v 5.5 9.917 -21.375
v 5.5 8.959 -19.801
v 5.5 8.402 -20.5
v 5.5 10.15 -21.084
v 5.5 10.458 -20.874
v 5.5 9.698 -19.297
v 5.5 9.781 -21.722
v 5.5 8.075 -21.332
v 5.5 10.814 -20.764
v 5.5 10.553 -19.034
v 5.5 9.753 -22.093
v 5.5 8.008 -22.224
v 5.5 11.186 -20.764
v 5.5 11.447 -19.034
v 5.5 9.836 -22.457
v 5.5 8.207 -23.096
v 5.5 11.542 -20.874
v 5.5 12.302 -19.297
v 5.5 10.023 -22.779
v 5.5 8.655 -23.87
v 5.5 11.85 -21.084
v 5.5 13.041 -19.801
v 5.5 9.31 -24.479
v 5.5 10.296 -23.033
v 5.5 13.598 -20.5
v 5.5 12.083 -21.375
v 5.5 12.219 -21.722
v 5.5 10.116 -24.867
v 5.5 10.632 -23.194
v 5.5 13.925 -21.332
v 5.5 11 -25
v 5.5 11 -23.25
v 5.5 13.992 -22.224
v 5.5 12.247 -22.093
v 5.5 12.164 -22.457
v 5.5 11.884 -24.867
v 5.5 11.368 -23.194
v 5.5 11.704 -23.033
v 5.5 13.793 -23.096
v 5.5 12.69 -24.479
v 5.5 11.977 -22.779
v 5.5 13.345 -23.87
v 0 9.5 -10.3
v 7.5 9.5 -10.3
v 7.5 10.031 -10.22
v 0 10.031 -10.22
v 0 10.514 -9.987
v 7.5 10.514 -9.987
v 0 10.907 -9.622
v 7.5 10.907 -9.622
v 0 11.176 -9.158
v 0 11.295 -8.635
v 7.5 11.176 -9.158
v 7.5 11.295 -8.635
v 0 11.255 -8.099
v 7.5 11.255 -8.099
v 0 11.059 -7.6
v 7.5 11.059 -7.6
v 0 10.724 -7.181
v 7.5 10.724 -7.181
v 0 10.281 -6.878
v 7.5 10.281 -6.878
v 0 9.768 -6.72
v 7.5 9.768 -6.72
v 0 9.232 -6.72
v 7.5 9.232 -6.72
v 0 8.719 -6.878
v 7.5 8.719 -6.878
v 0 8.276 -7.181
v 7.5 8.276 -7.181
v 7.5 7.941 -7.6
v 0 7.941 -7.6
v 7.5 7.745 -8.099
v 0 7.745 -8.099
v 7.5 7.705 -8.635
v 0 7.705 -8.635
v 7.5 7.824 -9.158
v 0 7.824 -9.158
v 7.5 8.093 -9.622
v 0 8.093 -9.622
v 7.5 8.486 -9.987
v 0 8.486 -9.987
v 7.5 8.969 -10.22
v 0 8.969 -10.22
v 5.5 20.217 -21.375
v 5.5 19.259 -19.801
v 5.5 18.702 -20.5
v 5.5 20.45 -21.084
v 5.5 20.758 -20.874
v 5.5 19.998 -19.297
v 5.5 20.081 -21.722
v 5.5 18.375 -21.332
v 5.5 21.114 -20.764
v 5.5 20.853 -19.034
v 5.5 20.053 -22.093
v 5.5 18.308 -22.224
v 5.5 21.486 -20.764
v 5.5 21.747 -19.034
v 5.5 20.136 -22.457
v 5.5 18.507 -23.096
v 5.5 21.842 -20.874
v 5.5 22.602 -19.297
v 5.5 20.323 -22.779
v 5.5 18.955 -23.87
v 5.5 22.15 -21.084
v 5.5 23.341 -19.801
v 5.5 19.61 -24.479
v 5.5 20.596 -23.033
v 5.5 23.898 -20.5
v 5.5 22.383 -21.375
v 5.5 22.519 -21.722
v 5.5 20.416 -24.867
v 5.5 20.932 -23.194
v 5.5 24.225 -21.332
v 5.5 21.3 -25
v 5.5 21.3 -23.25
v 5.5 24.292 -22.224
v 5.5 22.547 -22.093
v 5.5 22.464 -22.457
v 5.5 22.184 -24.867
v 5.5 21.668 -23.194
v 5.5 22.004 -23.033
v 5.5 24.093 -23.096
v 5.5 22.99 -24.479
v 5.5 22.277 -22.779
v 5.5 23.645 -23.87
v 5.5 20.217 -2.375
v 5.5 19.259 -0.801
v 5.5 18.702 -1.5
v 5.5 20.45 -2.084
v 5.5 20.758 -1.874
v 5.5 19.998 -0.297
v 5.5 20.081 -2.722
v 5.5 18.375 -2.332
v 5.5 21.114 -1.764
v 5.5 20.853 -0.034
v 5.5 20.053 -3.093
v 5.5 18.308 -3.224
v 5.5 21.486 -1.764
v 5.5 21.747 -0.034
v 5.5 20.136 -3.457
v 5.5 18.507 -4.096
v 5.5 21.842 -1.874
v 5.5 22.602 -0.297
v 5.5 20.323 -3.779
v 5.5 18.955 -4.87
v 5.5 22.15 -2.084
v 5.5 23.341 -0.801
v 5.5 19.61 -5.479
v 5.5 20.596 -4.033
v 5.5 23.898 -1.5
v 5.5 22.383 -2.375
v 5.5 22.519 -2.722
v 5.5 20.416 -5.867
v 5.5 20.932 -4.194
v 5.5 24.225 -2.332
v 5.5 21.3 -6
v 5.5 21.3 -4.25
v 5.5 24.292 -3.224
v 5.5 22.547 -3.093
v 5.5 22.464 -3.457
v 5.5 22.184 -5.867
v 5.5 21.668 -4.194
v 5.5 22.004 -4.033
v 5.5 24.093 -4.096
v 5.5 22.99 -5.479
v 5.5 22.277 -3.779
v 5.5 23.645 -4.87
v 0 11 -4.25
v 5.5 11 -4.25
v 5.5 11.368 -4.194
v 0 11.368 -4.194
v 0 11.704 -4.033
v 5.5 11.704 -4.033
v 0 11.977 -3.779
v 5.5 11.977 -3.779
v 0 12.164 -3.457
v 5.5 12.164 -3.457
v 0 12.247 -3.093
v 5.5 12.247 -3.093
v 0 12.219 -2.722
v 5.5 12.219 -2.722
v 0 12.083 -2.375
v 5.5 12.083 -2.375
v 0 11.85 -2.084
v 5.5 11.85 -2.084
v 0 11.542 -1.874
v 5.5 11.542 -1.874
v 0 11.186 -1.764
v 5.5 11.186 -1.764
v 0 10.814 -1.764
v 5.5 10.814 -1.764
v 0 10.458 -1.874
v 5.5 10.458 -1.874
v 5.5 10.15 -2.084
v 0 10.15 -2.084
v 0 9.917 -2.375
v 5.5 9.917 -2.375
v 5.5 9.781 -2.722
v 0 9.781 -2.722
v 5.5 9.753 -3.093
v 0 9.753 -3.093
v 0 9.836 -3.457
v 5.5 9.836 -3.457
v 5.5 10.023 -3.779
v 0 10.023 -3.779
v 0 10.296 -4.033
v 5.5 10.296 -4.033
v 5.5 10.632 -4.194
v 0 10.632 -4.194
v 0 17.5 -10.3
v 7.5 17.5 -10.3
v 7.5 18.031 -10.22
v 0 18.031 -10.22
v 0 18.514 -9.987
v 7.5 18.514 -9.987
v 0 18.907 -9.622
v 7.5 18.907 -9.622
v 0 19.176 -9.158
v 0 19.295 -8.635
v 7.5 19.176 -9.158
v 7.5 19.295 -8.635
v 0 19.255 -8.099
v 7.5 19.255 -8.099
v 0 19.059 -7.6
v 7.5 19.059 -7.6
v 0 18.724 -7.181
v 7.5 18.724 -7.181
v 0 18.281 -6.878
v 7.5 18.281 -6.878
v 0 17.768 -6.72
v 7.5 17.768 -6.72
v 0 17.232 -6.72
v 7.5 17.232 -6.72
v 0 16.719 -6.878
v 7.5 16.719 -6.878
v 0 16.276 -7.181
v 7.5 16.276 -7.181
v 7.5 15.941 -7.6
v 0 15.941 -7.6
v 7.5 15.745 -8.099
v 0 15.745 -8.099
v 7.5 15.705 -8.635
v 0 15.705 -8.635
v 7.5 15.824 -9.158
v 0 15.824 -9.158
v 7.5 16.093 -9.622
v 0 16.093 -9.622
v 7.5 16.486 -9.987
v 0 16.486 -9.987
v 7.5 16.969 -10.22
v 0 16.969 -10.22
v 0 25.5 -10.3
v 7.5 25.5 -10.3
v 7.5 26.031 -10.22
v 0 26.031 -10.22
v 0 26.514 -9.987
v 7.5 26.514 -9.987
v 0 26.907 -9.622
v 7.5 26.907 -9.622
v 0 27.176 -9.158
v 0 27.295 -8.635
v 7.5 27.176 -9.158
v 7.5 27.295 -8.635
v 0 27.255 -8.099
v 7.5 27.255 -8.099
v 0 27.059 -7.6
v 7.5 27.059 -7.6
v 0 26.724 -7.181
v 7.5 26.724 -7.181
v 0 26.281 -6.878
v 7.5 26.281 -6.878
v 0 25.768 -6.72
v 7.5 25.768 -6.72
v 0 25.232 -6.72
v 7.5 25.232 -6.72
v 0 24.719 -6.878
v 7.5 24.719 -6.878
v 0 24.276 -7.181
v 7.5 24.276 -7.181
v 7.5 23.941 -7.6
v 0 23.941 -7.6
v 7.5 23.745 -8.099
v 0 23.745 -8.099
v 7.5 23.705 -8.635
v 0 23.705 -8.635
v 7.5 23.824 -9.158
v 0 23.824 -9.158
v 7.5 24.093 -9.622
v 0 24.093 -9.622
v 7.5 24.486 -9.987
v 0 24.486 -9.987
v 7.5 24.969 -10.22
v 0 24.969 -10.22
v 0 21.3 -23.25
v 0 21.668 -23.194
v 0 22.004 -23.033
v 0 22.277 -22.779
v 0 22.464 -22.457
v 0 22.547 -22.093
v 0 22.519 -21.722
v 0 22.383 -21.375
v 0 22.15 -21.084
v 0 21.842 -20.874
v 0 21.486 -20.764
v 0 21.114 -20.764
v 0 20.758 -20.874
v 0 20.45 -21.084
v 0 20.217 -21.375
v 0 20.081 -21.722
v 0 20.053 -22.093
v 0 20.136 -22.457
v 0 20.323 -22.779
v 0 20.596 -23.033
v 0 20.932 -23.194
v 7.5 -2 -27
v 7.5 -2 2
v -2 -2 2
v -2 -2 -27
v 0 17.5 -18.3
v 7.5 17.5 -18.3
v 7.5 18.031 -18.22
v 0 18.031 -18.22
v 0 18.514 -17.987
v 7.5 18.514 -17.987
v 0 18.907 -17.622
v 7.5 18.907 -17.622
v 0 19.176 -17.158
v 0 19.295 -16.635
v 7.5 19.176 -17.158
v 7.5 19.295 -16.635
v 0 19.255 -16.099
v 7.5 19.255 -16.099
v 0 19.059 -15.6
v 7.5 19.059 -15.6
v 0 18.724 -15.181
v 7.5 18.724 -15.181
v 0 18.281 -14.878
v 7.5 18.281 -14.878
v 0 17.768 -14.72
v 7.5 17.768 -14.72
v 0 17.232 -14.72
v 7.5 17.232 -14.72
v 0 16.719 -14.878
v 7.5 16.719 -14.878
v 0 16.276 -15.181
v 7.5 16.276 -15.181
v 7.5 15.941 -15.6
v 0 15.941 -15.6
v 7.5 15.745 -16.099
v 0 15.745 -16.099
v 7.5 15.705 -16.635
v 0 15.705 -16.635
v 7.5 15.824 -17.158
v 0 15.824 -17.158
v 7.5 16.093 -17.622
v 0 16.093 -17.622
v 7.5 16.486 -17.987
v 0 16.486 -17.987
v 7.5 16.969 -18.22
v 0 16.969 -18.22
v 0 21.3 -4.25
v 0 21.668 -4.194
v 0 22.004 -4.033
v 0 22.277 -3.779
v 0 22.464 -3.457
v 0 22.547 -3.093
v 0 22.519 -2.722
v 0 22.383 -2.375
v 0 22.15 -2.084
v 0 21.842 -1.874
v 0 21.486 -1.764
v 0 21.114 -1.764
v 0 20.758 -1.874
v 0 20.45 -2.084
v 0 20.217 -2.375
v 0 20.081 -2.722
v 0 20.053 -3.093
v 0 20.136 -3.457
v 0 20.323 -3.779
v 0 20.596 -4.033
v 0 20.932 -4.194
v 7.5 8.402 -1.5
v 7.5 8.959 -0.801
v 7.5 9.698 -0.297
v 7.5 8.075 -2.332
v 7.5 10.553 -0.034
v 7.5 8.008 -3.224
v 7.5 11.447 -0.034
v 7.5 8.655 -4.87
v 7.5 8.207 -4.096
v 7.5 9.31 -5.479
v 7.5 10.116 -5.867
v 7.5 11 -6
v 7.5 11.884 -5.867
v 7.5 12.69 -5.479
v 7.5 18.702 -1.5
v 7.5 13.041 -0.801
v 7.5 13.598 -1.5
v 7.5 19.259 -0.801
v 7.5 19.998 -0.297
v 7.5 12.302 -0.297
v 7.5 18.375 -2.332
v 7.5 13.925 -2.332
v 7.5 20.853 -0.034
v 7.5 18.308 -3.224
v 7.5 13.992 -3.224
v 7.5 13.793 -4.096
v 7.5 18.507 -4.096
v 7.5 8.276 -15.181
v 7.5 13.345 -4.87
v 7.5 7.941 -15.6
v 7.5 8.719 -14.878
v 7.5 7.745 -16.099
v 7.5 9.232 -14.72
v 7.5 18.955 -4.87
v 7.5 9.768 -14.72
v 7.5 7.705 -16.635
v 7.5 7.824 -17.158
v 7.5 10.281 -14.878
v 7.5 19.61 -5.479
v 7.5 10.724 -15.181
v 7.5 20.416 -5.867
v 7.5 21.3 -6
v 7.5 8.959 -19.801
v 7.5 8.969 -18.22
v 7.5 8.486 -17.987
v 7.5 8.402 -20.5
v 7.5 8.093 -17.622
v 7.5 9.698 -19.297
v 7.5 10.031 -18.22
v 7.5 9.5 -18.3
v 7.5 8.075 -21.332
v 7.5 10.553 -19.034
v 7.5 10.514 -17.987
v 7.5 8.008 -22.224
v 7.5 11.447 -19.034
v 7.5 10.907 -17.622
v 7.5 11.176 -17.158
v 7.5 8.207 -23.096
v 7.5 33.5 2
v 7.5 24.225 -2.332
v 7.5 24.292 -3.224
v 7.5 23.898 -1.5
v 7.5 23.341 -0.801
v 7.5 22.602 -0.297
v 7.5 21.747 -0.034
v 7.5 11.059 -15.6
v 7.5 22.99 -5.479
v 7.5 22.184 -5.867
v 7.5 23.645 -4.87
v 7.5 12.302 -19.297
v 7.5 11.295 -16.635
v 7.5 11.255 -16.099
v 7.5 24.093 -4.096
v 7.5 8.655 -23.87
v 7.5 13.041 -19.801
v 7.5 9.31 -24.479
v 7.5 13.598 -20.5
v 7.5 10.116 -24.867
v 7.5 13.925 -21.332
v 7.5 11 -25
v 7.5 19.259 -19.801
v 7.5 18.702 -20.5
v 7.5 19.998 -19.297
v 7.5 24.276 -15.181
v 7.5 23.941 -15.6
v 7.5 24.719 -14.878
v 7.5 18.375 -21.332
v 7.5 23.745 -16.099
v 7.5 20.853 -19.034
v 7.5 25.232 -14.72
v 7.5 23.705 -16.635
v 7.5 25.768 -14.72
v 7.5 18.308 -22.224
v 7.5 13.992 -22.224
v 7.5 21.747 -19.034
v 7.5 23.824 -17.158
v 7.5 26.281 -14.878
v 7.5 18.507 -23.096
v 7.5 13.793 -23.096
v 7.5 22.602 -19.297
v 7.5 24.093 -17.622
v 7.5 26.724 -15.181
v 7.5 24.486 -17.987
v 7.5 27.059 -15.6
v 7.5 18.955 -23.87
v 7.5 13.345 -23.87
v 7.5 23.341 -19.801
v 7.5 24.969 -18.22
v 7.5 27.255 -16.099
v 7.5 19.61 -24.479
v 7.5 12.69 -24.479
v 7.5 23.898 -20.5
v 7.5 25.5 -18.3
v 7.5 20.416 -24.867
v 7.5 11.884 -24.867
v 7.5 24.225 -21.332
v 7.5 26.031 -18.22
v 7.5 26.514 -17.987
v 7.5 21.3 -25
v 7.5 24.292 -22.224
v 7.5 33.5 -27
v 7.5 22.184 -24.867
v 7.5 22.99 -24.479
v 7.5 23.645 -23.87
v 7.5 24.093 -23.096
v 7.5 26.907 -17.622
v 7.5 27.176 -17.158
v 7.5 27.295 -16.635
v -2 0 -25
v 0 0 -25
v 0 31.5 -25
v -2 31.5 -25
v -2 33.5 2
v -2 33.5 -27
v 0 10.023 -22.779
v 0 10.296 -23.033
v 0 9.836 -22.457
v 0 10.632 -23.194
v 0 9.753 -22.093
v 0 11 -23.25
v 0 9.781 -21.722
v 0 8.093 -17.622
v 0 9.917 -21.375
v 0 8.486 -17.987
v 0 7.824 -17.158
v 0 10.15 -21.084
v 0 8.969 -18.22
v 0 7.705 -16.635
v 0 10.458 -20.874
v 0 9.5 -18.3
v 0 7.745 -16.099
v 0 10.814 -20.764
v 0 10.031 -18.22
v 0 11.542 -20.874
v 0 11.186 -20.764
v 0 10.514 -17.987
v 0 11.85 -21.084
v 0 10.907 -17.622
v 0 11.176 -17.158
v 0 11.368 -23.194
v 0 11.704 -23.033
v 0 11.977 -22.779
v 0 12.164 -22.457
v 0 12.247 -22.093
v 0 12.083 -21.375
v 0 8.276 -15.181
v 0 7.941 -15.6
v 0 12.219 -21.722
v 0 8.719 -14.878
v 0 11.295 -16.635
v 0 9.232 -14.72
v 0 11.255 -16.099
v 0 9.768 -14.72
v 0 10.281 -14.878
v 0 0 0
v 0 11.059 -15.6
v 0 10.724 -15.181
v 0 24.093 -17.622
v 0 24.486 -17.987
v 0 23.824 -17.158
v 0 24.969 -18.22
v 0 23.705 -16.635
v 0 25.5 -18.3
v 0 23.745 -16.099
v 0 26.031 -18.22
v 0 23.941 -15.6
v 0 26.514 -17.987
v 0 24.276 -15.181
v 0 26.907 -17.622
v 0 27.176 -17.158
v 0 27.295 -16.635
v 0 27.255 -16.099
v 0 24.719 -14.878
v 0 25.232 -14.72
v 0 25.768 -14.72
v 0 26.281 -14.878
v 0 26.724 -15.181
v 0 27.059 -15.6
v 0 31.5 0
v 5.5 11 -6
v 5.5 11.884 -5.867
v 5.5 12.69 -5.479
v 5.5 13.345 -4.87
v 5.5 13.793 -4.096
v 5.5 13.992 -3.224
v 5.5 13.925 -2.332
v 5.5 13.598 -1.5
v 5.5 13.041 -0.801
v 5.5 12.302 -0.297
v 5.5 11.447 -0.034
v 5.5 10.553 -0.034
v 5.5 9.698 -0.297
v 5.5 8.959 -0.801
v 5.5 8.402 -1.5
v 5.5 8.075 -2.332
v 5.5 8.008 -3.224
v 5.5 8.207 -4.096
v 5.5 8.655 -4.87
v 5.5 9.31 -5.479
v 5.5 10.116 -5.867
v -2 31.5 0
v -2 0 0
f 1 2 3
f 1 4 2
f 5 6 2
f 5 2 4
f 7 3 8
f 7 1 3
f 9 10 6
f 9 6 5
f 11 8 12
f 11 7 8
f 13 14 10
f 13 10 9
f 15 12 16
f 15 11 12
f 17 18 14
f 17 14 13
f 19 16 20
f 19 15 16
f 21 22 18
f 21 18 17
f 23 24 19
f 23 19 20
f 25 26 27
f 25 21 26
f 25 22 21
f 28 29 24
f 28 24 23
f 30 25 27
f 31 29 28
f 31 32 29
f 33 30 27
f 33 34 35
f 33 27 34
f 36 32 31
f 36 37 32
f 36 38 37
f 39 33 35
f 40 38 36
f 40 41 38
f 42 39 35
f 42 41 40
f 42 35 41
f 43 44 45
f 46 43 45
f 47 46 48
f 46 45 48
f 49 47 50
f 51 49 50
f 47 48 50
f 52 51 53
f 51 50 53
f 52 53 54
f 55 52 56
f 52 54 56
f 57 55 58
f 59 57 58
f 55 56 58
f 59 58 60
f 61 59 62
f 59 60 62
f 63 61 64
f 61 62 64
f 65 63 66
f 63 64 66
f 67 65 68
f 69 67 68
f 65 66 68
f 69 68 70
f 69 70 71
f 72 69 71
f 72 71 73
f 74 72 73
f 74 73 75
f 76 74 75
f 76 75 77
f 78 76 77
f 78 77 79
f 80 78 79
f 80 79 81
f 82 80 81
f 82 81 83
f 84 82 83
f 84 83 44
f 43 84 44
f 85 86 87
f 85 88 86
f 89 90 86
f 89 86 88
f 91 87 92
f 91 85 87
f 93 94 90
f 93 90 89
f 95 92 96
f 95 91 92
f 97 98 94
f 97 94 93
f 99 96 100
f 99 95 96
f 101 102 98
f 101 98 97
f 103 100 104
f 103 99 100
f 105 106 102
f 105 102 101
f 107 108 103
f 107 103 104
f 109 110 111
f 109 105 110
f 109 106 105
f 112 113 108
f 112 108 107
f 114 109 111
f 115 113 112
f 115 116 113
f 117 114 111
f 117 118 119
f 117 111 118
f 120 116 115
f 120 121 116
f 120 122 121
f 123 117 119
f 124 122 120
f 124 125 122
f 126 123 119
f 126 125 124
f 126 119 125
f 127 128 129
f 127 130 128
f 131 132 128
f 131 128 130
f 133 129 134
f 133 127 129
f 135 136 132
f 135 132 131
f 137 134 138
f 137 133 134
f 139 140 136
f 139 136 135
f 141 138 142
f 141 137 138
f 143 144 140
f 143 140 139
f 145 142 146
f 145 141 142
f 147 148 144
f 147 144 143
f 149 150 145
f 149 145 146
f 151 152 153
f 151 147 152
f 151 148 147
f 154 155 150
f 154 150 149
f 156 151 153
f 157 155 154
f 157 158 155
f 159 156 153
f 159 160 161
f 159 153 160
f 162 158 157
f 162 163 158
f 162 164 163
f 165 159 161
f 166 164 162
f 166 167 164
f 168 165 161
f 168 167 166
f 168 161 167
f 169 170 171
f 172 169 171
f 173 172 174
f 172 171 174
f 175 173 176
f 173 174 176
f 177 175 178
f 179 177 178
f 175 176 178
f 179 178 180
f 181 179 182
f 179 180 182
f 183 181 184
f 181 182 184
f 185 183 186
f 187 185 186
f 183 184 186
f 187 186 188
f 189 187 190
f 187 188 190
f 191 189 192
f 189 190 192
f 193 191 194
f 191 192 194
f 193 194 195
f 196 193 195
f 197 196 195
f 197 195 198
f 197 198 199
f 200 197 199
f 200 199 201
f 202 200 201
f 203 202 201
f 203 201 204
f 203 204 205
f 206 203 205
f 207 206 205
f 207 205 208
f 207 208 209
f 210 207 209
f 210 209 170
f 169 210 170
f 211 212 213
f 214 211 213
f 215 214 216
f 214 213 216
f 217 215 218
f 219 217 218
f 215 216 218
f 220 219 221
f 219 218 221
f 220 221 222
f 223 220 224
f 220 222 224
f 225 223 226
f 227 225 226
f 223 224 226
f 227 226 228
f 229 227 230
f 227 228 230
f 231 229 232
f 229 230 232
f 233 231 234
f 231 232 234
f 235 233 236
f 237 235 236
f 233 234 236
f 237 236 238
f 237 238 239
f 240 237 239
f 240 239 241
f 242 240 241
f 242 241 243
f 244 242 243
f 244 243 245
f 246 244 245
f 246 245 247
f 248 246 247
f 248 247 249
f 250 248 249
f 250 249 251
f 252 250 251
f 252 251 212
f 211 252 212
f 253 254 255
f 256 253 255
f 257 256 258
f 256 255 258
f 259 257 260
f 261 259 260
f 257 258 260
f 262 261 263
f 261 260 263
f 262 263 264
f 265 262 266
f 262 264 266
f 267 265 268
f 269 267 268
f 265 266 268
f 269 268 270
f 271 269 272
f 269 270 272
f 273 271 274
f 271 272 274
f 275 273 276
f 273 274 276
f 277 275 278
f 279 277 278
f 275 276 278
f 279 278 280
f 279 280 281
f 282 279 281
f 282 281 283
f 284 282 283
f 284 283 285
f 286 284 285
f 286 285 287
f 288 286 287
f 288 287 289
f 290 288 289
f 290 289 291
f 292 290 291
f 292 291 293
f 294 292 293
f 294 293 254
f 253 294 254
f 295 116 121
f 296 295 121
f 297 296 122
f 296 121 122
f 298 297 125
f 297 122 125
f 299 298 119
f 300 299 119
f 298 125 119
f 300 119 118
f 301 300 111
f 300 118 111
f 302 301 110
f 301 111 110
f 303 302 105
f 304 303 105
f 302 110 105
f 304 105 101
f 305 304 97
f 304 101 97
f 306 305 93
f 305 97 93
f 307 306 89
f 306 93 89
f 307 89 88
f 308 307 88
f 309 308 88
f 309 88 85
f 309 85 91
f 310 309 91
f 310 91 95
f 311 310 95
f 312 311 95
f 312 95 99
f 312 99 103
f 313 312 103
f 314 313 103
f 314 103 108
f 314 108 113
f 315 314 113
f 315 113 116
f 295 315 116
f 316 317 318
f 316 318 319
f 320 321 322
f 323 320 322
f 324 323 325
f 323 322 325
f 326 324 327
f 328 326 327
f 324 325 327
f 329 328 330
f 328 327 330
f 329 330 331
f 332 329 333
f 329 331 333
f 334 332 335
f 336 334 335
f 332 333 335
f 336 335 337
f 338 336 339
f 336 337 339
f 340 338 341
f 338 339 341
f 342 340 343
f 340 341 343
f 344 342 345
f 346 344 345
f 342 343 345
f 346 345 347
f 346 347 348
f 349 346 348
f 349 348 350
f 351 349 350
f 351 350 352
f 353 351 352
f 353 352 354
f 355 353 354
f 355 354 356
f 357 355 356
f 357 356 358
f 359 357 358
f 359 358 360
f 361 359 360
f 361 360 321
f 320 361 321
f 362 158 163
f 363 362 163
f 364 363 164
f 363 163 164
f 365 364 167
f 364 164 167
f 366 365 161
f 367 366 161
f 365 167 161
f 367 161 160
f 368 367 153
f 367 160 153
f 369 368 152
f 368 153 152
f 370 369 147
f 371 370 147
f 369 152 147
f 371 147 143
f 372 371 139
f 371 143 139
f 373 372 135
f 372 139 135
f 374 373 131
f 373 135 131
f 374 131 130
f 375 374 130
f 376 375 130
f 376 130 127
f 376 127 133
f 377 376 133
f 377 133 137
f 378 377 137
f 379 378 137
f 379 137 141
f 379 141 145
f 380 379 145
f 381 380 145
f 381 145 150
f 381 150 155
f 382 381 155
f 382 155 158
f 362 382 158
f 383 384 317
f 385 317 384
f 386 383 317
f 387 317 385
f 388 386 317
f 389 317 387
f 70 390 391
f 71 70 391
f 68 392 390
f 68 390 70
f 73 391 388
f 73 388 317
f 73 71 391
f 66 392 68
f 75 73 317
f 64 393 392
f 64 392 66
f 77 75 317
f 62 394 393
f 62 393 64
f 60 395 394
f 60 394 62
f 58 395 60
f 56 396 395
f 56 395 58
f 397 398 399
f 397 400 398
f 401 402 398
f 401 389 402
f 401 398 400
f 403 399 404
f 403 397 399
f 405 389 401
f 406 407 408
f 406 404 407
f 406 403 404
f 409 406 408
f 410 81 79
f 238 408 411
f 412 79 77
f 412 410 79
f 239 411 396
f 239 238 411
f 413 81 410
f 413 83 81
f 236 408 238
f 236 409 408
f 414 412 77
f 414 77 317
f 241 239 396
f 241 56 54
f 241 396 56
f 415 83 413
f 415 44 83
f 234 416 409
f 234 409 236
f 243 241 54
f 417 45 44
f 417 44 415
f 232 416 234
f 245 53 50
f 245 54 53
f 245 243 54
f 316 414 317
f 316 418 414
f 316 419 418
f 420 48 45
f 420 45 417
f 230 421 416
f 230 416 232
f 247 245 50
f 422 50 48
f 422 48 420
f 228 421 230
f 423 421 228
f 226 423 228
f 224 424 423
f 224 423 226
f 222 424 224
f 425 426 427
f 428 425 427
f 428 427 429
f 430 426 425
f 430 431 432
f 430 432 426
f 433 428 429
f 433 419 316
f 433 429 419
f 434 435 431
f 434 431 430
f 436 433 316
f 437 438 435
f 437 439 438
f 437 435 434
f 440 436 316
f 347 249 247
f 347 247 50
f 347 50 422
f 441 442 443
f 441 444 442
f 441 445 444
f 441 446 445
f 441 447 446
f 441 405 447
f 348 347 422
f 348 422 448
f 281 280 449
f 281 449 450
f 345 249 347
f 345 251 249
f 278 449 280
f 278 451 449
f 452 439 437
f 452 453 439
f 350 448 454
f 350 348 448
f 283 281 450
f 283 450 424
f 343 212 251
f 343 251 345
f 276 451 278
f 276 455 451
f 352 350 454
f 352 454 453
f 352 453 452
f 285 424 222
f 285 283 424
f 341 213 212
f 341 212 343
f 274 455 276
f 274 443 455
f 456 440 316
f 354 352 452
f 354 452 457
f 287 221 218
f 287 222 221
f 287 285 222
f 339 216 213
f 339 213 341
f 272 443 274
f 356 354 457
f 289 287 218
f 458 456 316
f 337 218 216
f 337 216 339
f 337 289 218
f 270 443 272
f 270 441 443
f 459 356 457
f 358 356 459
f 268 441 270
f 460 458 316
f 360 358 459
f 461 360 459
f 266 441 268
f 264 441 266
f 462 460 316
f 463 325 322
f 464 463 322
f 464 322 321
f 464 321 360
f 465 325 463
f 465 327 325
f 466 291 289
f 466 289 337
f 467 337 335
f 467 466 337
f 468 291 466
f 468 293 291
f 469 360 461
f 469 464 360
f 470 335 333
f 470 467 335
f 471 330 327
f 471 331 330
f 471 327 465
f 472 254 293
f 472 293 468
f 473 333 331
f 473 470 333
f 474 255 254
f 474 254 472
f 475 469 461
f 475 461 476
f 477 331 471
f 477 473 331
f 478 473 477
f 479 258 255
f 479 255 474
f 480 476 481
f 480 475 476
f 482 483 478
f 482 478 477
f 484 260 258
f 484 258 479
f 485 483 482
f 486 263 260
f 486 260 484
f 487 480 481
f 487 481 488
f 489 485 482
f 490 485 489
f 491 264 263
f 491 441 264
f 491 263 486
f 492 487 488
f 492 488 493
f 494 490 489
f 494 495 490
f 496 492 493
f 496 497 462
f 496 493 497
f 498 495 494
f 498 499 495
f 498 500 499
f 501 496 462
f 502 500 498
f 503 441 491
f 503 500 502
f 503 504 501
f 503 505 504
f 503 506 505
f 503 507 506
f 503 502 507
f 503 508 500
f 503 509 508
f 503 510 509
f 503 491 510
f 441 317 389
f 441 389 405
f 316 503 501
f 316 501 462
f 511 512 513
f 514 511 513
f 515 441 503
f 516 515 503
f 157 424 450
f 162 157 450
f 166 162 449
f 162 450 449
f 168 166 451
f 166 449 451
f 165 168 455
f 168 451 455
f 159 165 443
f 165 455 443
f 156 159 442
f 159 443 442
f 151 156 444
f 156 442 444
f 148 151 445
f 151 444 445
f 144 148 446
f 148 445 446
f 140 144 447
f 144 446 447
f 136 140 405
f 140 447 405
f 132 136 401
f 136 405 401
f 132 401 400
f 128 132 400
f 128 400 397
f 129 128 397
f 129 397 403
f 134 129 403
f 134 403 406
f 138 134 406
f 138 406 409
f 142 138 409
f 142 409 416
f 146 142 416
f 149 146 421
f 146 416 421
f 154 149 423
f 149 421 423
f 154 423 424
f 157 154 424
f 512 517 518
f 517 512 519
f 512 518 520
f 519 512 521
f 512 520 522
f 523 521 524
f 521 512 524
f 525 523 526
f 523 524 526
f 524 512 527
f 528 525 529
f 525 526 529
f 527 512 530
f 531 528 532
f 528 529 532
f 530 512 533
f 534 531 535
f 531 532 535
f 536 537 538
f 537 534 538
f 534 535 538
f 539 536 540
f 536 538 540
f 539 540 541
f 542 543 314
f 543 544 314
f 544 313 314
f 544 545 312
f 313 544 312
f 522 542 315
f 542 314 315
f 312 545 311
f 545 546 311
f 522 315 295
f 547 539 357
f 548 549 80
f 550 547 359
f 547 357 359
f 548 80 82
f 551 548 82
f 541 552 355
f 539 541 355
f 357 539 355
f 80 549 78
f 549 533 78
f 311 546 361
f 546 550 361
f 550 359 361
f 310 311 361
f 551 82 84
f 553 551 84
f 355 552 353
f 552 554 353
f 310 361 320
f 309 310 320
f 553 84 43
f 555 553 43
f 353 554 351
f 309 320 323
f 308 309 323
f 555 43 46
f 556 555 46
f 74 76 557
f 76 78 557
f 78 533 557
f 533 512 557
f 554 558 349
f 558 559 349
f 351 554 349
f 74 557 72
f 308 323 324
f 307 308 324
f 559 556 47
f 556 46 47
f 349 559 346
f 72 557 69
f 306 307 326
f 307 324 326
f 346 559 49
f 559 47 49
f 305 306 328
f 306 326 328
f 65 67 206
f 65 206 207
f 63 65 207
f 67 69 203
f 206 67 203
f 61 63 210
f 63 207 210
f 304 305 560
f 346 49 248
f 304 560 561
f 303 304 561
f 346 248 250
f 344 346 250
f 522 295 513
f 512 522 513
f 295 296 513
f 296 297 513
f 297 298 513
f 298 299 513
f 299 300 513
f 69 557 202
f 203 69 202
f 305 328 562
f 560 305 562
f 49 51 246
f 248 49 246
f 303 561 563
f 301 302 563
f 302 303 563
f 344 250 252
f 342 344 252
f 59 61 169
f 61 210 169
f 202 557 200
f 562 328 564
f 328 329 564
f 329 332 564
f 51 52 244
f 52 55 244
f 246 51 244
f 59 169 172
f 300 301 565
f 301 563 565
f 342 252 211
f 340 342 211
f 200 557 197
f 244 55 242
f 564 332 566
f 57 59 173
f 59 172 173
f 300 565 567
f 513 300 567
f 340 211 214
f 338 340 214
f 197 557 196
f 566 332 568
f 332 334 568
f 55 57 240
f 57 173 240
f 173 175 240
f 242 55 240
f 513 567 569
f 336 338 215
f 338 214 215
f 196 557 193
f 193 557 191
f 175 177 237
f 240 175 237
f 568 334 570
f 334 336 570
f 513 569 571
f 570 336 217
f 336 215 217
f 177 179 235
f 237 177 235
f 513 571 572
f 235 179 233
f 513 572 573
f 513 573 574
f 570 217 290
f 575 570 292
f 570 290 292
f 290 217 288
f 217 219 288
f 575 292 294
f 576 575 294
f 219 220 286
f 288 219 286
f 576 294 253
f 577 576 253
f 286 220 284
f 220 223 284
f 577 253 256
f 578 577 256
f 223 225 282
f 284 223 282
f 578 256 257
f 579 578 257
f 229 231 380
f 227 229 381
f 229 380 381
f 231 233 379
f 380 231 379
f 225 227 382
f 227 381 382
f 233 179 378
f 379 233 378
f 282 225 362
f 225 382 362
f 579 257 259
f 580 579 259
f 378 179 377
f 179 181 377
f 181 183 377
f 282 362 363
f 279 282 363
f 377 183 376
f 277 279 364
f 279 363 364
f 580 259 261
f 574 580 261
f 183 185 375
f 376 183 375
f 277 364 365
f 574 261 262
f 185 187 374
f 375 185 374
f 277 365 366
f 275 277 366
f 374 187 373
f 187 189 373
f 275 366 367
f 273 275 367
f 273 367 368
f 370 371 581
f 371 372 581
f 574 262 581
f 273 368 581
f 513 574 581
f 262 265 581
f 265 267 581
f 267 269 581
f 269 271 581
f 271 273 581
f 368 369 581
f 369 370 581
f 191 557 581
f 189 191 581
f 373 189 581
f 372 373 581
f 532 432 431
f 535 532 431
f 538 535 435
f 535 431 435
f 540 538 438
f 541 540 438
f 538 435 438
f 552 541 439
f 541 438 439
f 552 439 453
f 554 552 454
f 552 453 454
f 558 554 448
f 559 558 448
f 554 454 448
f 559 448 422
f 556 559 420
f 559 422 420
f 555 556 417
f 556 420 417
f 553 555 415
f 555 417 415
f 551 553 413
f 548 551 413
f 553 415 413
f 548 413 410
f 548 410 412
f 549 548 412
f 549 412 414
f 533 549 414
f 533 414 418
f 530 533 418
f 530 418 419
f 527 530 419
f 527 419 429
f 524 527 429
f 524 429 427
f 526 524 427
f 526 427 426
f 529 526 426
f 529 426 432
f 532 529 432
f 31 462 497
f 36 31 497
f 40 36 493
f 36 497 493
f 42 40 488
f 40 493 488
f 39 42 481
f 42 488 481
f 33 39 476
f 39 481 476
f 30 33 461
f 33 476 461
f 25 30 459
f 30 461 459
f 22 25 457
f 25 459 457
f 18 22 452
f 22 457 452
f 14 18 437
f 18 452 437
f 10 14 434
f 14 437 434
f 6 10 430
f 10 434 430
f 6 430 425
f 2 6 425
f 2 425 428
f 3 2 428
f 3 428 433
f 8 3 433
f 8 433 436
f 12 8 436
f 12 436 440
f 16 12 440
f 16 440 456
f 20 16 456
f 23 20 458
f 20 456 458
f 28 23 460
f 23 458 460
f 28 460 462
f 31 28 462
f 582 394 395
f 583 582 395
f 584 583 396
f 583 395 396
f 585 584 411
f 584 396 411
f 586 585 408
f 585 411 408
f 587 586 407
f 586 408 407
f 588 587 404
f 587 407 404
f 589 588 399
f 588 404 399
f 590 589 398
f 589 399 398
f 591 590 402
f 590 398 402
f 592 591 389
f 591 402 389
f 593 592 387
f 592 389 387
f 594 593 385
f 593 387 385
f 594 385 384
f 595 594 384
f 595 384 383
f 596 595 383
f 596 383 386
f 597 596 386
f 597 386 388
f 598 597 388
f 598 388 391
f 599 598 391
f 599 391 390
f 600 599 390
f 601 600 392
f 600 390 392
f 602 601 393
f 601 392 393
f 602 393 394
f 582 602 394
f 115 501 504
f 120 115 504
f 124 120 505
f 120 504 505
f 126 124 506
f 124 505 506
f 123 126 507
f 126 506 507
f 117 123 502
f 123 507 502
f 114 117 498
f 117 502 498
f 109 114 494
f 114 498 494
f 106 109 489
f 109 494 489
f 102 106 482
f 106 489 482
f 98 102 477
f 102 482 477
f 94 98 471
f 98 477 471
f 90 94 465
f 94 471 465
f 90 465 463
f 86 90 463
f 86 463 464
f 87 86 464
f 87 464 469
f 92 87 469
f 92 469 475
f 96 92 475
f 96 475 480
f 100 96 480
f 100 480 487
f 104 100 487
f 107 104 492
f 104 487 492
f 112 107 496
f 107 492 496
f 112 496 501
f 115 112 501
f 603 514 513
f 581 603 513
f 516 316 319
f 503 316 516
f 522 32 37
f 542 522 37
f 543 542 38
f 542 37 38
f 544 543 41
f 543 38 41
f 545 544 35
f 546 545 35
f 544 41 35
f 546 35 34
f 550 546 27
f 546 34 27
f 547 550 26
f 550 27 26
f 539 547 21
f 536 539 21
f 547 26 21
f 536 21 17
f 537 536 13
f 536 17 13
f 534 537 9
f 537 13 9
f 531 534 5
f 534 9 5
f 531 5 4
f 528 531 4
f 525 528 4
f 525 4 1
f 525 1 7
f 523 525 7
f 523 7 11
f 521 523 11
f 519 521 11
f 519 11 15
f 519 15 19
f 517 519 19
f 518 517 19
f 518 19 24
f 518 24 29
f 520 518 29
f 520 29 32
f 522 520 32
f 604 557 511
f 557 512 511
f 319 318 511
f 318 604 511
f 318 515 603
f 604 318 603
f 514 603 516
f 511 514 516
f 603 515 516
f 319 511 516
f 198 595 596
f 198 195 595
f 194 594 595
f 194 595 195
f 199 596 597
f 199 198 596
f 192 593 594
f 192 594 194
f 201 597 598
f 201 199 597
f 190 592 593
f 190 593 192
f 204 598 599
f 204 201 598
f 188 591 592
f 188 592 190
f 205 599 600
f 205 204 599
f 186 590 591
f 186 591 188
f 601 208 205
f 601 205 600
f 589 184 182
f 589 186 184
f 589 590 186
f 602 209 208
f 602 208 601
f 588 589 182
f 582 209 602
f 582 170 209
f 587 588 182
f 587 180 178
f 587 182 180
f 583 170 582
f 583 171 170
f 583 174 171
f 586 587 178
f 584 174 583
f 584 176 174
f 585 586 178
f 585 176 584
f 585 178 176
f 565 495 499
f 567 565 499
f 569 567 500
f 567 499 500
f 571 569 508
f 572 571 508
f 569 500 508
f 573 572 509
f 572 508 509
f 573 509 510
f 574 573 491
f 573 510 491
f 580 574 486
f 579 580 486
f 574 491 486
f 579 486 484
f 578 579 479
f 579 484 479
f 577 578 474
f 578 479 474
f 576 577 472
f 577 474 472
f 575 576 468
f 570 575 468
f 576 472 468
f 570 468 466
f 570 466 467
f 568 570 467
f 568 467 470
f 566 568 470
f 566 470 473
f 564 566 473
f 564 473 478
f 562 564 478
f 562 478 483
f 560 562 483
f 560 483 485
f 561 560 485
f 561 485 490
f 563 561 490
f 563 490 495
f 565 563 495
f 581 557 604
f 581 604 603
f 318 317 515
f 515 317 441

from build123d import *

# Parameters (mm, degrees)
SKETCH_1_W          = 25
SKETCH_1_H          = 31.5
EXTRUDE_1_DEPTH     = 2
SKETCH_2_R          = 1.25
CUT_EXTRUDE_1_DEPTH = 5
SKETCH_3_W          = 2
SKETCH_3_H          = 31.5
EXTRUDE_2_DEPTH     = 2
SKETCH_4_W          = 2
SKETCH_4_H          = 31.5
EXTRUDE_3_DEPTH     = 2
SKETCH_5_W          = 2
SKETCH_5_H          = 31.5
EXTRUDE_4_DEPTH     = 2
SKETCH_6_W          = 2
SKETCH_6_H          = 31.5
EXTRUDE_5_DEPTH     = 2
SKETCH_7_W          = 4
SKETCH_7_H          = 29
EXTRUDE_6_DEPTH     = 2
SKETCH_8_W          = 4
SKETCH_8_H          = 29
EXTRUDE_7_DEPTH     = 2
EXTRUDE_START       = 3
SKETCH_9_W          = 29
SKETCH_9_H          = 35.5
SKETCH_9_R          = 1.25
EXTRUDE_8_DEPTH     = 3
EXTRUDE_START_2     = 2.5
SKETCH_11_W         = 29
SKETCH_11_H         = 35.5
SKETCH_11_R         = 1.25
EXTRUDE_9_DEPTH     = 2.5
SKETCH_12_R         = 1.8
CUT_EXTRUDE_2_DEPTH = 13.5
SKETCH_13_R         = 3
CUT_EXTRUDE_3_DEPTH = 2


with BuildPart() as part:
    # 草圖1 → 填料-伸長1 (new body)
    with BuildSketch(Plane(origin=(0, 0, 0), x_dir=(0, 0, -1), z_dir=(1, 0, 0))):
        with Locations((12.5, 15.75)):
            Rectangle(SKETCH_1_W, SKETCH_1_H)
    extrude(amount=EXTRUDE_1_DEPTH)

    # 草圖2 → 除料-伸長1 (cut)
    with BuildSketch(Plane(origin=(2, 0, 0), x_dir=(0, 0, -1), z_dir=(1, 0, 0))):
        with Locations((22, 21.3)):
            Circle(SKETCH_2_R)
        with Locations((22, 11)):
            Circle(SKETCH_2_R)
        with Locations((3, 21.3)):
            Circle(SKETCH_2_R)
        with Locations((3, 11)):
            Circle(SKETCH_2_R)
    extrude(amount=-CUT_EXTRUDE_1_DEPTH, mode=Mode.SUBTRACT)

    # 草圖3 → 填料-伸長2 (add)
    with BuildSketch(Plane.XY):
        with Locations((1, 15.75)):
            Rectangle(SKETCH_3_W, SKETCH_3_H)
    extrude(amount=EXTRUDE_2_DEPTH)

    # 草圖4 → 填料-伸長3 (add)
    with BuildSketch(Plane(origin=(0, 0, -25), x_dir=(-1, 0, 0), z_dir=(0, 0, -1))):
        with Locations((-1, 15.75)):
            Rectangle(SKETCH_4_W, SKETCH_4_H)
    extrude(amount=EXTRUDE_3_DEPTH)

    # 草圖5 → 填料-伸長4 (add)
    with BuildSketch(Plane.ZY):
        with Locations((-26, 15.75)):
            Rectangle(SKETCH_5_W, SKETCH_5_H)
    extrude(amount=EXTRUDE_4_DEPTH)

    # 草圖6 → 填料-伸長5 (add)
    with BuildSketch(Plane.ZY):
        with Locations((1, 15.75)):
            Rectangle(SKETCH_6_W, SKETCH_6_H)
    extrude(amount=EXTRUDE_5_DEPTH)

    # 草圖7 → 填料-伸長6 (add)
    with BuildSketch(Plane(origin=(0, 31.5, 0), x_dir=(1, 0, 0), z_dir=(0, 1, 0))):
        with Locations((0, 12.5)):
            Rectangle(SKETCH_7_W, SKETCH_7_H)
    extrude(amount=EXTRUDE_6_DEPTH)

    # 草圖8 → 填料-伸長7 (add)
    with BuildSketch(Plane(origin=(0, 0, 0), x_dir=(-1, 0, 0), z_dir=(0, -1, 0))):
        with Locations((0, 12.5)):
            Rectangle(SKETCH_8_W, SKETCH_8_H)
    extrude(amount=EXTRUDE_7_DEPTH)

    # 草圖9 → 填料-伸長8 (add)
    with BuildSketch(Plane(origin=(2, 0, 0), x_dir=(0, 0, -1), z_dir=(1, 0, 0)).offset(EXTRUDE_START)):
        with Locations((12.5, 15.75)):
            Rectangle(SKETCH_9_W, SKETCH_9_H)
        with Locations((3, 21.3)):
            Circle(SKETCH_9_R, mode=Mode.SUBTRACT)
        with Locations((22, 21.3)):
            Circle(SKETCH_9_R, mode=Mode.SUBTRACT)
        with Locations((22, 11)):
            Circle(SKETCH_9_R, mode=Mode.SUBTRACT)
        with Locations((3, 11)):
            Circle(SKETCH_9_R, mode=Mode.SUBTRACT)
    extrude(amount=-EXTRUDE_8_DEPTH)

    # 草圖11 → 填料-伸長9 (add)
    with BuildSketch(Plane(origin=(5, 0, 0), x_dir=(0, 0, -1), z_dir=(1, 0, 0)).offset(EXTRUDE_START_2)):
        with Locations((12.5, 15.75)):
            Rectangle(SKETCH_11_W, SKETCH_11_H)
        with Locations((3, 21.3)):
            Circle(SKETCH_11_R, mode=Mode.SUBTRACT)
        with Locations((22, 21.3)):
            Circle(SKETCH_11_R, mode=Mode.SUBTRACT)
        with Locations((22, 11)):
            Circle(SKETCH_11_R, mode=Mode.SUBTRACT)
        with Locations((3, 11)):
            Circle(SKETCH_11_R, mode=Mode.SUBTRACT)
    extrude(amount=-EXTRUDE_9_DEPTH)

    # 草圖12 → 除料-伸長2 (cut)
    with BuildSketch(Plane(origin=(7.5, 0, 0), x_dir=(0, 0, -1), z_dir=(1, 0, 0))):
        with Locations((8.5, 25.5)):
            Circle(SKETCH_12_R)
        with Locations((16.5, 25.5)):
            Circle(SKETCH_12_R)
        with Locations((16.5, 17.5)):
            Circle(SKETCH_12_R)
        with Locations((16.5, 9.5)):
            Circle(SKETCH_12_R)
        with Locations((8.5, 9.5)):
            Circle(SKETCH_12_R)
        with Locations((8.5, 17.5)):
            Circle(SKETCH_12_R)
    extrude(amount=-CUT_EXTRUDE_2_DEPTH, mode=Mode.SUBTRACT)

    # 草圖13 → 除料-伸長3 (cut)
    with BuildSketch(Plane(origin=(7.5, 0, 0), x_dir=(0, 0, -1), z_dir=(1, 0, 0))):
        with Locations((3, 21.3)):
            Circle(SKETCH_13_R)
        with Locations((3, 11)):
            Circle(SKETCH_13_R)
        with Locations((22, 11)):
            Circle(SKETCH_13_R)
        with Locations((22, 21.3)):
            Circle(SKETCH_13_R)
    extrude(amount=-CUT_EXTRUDE_3_DEPTH, mode=Mode.SUBTRACT)


solid = part.part
